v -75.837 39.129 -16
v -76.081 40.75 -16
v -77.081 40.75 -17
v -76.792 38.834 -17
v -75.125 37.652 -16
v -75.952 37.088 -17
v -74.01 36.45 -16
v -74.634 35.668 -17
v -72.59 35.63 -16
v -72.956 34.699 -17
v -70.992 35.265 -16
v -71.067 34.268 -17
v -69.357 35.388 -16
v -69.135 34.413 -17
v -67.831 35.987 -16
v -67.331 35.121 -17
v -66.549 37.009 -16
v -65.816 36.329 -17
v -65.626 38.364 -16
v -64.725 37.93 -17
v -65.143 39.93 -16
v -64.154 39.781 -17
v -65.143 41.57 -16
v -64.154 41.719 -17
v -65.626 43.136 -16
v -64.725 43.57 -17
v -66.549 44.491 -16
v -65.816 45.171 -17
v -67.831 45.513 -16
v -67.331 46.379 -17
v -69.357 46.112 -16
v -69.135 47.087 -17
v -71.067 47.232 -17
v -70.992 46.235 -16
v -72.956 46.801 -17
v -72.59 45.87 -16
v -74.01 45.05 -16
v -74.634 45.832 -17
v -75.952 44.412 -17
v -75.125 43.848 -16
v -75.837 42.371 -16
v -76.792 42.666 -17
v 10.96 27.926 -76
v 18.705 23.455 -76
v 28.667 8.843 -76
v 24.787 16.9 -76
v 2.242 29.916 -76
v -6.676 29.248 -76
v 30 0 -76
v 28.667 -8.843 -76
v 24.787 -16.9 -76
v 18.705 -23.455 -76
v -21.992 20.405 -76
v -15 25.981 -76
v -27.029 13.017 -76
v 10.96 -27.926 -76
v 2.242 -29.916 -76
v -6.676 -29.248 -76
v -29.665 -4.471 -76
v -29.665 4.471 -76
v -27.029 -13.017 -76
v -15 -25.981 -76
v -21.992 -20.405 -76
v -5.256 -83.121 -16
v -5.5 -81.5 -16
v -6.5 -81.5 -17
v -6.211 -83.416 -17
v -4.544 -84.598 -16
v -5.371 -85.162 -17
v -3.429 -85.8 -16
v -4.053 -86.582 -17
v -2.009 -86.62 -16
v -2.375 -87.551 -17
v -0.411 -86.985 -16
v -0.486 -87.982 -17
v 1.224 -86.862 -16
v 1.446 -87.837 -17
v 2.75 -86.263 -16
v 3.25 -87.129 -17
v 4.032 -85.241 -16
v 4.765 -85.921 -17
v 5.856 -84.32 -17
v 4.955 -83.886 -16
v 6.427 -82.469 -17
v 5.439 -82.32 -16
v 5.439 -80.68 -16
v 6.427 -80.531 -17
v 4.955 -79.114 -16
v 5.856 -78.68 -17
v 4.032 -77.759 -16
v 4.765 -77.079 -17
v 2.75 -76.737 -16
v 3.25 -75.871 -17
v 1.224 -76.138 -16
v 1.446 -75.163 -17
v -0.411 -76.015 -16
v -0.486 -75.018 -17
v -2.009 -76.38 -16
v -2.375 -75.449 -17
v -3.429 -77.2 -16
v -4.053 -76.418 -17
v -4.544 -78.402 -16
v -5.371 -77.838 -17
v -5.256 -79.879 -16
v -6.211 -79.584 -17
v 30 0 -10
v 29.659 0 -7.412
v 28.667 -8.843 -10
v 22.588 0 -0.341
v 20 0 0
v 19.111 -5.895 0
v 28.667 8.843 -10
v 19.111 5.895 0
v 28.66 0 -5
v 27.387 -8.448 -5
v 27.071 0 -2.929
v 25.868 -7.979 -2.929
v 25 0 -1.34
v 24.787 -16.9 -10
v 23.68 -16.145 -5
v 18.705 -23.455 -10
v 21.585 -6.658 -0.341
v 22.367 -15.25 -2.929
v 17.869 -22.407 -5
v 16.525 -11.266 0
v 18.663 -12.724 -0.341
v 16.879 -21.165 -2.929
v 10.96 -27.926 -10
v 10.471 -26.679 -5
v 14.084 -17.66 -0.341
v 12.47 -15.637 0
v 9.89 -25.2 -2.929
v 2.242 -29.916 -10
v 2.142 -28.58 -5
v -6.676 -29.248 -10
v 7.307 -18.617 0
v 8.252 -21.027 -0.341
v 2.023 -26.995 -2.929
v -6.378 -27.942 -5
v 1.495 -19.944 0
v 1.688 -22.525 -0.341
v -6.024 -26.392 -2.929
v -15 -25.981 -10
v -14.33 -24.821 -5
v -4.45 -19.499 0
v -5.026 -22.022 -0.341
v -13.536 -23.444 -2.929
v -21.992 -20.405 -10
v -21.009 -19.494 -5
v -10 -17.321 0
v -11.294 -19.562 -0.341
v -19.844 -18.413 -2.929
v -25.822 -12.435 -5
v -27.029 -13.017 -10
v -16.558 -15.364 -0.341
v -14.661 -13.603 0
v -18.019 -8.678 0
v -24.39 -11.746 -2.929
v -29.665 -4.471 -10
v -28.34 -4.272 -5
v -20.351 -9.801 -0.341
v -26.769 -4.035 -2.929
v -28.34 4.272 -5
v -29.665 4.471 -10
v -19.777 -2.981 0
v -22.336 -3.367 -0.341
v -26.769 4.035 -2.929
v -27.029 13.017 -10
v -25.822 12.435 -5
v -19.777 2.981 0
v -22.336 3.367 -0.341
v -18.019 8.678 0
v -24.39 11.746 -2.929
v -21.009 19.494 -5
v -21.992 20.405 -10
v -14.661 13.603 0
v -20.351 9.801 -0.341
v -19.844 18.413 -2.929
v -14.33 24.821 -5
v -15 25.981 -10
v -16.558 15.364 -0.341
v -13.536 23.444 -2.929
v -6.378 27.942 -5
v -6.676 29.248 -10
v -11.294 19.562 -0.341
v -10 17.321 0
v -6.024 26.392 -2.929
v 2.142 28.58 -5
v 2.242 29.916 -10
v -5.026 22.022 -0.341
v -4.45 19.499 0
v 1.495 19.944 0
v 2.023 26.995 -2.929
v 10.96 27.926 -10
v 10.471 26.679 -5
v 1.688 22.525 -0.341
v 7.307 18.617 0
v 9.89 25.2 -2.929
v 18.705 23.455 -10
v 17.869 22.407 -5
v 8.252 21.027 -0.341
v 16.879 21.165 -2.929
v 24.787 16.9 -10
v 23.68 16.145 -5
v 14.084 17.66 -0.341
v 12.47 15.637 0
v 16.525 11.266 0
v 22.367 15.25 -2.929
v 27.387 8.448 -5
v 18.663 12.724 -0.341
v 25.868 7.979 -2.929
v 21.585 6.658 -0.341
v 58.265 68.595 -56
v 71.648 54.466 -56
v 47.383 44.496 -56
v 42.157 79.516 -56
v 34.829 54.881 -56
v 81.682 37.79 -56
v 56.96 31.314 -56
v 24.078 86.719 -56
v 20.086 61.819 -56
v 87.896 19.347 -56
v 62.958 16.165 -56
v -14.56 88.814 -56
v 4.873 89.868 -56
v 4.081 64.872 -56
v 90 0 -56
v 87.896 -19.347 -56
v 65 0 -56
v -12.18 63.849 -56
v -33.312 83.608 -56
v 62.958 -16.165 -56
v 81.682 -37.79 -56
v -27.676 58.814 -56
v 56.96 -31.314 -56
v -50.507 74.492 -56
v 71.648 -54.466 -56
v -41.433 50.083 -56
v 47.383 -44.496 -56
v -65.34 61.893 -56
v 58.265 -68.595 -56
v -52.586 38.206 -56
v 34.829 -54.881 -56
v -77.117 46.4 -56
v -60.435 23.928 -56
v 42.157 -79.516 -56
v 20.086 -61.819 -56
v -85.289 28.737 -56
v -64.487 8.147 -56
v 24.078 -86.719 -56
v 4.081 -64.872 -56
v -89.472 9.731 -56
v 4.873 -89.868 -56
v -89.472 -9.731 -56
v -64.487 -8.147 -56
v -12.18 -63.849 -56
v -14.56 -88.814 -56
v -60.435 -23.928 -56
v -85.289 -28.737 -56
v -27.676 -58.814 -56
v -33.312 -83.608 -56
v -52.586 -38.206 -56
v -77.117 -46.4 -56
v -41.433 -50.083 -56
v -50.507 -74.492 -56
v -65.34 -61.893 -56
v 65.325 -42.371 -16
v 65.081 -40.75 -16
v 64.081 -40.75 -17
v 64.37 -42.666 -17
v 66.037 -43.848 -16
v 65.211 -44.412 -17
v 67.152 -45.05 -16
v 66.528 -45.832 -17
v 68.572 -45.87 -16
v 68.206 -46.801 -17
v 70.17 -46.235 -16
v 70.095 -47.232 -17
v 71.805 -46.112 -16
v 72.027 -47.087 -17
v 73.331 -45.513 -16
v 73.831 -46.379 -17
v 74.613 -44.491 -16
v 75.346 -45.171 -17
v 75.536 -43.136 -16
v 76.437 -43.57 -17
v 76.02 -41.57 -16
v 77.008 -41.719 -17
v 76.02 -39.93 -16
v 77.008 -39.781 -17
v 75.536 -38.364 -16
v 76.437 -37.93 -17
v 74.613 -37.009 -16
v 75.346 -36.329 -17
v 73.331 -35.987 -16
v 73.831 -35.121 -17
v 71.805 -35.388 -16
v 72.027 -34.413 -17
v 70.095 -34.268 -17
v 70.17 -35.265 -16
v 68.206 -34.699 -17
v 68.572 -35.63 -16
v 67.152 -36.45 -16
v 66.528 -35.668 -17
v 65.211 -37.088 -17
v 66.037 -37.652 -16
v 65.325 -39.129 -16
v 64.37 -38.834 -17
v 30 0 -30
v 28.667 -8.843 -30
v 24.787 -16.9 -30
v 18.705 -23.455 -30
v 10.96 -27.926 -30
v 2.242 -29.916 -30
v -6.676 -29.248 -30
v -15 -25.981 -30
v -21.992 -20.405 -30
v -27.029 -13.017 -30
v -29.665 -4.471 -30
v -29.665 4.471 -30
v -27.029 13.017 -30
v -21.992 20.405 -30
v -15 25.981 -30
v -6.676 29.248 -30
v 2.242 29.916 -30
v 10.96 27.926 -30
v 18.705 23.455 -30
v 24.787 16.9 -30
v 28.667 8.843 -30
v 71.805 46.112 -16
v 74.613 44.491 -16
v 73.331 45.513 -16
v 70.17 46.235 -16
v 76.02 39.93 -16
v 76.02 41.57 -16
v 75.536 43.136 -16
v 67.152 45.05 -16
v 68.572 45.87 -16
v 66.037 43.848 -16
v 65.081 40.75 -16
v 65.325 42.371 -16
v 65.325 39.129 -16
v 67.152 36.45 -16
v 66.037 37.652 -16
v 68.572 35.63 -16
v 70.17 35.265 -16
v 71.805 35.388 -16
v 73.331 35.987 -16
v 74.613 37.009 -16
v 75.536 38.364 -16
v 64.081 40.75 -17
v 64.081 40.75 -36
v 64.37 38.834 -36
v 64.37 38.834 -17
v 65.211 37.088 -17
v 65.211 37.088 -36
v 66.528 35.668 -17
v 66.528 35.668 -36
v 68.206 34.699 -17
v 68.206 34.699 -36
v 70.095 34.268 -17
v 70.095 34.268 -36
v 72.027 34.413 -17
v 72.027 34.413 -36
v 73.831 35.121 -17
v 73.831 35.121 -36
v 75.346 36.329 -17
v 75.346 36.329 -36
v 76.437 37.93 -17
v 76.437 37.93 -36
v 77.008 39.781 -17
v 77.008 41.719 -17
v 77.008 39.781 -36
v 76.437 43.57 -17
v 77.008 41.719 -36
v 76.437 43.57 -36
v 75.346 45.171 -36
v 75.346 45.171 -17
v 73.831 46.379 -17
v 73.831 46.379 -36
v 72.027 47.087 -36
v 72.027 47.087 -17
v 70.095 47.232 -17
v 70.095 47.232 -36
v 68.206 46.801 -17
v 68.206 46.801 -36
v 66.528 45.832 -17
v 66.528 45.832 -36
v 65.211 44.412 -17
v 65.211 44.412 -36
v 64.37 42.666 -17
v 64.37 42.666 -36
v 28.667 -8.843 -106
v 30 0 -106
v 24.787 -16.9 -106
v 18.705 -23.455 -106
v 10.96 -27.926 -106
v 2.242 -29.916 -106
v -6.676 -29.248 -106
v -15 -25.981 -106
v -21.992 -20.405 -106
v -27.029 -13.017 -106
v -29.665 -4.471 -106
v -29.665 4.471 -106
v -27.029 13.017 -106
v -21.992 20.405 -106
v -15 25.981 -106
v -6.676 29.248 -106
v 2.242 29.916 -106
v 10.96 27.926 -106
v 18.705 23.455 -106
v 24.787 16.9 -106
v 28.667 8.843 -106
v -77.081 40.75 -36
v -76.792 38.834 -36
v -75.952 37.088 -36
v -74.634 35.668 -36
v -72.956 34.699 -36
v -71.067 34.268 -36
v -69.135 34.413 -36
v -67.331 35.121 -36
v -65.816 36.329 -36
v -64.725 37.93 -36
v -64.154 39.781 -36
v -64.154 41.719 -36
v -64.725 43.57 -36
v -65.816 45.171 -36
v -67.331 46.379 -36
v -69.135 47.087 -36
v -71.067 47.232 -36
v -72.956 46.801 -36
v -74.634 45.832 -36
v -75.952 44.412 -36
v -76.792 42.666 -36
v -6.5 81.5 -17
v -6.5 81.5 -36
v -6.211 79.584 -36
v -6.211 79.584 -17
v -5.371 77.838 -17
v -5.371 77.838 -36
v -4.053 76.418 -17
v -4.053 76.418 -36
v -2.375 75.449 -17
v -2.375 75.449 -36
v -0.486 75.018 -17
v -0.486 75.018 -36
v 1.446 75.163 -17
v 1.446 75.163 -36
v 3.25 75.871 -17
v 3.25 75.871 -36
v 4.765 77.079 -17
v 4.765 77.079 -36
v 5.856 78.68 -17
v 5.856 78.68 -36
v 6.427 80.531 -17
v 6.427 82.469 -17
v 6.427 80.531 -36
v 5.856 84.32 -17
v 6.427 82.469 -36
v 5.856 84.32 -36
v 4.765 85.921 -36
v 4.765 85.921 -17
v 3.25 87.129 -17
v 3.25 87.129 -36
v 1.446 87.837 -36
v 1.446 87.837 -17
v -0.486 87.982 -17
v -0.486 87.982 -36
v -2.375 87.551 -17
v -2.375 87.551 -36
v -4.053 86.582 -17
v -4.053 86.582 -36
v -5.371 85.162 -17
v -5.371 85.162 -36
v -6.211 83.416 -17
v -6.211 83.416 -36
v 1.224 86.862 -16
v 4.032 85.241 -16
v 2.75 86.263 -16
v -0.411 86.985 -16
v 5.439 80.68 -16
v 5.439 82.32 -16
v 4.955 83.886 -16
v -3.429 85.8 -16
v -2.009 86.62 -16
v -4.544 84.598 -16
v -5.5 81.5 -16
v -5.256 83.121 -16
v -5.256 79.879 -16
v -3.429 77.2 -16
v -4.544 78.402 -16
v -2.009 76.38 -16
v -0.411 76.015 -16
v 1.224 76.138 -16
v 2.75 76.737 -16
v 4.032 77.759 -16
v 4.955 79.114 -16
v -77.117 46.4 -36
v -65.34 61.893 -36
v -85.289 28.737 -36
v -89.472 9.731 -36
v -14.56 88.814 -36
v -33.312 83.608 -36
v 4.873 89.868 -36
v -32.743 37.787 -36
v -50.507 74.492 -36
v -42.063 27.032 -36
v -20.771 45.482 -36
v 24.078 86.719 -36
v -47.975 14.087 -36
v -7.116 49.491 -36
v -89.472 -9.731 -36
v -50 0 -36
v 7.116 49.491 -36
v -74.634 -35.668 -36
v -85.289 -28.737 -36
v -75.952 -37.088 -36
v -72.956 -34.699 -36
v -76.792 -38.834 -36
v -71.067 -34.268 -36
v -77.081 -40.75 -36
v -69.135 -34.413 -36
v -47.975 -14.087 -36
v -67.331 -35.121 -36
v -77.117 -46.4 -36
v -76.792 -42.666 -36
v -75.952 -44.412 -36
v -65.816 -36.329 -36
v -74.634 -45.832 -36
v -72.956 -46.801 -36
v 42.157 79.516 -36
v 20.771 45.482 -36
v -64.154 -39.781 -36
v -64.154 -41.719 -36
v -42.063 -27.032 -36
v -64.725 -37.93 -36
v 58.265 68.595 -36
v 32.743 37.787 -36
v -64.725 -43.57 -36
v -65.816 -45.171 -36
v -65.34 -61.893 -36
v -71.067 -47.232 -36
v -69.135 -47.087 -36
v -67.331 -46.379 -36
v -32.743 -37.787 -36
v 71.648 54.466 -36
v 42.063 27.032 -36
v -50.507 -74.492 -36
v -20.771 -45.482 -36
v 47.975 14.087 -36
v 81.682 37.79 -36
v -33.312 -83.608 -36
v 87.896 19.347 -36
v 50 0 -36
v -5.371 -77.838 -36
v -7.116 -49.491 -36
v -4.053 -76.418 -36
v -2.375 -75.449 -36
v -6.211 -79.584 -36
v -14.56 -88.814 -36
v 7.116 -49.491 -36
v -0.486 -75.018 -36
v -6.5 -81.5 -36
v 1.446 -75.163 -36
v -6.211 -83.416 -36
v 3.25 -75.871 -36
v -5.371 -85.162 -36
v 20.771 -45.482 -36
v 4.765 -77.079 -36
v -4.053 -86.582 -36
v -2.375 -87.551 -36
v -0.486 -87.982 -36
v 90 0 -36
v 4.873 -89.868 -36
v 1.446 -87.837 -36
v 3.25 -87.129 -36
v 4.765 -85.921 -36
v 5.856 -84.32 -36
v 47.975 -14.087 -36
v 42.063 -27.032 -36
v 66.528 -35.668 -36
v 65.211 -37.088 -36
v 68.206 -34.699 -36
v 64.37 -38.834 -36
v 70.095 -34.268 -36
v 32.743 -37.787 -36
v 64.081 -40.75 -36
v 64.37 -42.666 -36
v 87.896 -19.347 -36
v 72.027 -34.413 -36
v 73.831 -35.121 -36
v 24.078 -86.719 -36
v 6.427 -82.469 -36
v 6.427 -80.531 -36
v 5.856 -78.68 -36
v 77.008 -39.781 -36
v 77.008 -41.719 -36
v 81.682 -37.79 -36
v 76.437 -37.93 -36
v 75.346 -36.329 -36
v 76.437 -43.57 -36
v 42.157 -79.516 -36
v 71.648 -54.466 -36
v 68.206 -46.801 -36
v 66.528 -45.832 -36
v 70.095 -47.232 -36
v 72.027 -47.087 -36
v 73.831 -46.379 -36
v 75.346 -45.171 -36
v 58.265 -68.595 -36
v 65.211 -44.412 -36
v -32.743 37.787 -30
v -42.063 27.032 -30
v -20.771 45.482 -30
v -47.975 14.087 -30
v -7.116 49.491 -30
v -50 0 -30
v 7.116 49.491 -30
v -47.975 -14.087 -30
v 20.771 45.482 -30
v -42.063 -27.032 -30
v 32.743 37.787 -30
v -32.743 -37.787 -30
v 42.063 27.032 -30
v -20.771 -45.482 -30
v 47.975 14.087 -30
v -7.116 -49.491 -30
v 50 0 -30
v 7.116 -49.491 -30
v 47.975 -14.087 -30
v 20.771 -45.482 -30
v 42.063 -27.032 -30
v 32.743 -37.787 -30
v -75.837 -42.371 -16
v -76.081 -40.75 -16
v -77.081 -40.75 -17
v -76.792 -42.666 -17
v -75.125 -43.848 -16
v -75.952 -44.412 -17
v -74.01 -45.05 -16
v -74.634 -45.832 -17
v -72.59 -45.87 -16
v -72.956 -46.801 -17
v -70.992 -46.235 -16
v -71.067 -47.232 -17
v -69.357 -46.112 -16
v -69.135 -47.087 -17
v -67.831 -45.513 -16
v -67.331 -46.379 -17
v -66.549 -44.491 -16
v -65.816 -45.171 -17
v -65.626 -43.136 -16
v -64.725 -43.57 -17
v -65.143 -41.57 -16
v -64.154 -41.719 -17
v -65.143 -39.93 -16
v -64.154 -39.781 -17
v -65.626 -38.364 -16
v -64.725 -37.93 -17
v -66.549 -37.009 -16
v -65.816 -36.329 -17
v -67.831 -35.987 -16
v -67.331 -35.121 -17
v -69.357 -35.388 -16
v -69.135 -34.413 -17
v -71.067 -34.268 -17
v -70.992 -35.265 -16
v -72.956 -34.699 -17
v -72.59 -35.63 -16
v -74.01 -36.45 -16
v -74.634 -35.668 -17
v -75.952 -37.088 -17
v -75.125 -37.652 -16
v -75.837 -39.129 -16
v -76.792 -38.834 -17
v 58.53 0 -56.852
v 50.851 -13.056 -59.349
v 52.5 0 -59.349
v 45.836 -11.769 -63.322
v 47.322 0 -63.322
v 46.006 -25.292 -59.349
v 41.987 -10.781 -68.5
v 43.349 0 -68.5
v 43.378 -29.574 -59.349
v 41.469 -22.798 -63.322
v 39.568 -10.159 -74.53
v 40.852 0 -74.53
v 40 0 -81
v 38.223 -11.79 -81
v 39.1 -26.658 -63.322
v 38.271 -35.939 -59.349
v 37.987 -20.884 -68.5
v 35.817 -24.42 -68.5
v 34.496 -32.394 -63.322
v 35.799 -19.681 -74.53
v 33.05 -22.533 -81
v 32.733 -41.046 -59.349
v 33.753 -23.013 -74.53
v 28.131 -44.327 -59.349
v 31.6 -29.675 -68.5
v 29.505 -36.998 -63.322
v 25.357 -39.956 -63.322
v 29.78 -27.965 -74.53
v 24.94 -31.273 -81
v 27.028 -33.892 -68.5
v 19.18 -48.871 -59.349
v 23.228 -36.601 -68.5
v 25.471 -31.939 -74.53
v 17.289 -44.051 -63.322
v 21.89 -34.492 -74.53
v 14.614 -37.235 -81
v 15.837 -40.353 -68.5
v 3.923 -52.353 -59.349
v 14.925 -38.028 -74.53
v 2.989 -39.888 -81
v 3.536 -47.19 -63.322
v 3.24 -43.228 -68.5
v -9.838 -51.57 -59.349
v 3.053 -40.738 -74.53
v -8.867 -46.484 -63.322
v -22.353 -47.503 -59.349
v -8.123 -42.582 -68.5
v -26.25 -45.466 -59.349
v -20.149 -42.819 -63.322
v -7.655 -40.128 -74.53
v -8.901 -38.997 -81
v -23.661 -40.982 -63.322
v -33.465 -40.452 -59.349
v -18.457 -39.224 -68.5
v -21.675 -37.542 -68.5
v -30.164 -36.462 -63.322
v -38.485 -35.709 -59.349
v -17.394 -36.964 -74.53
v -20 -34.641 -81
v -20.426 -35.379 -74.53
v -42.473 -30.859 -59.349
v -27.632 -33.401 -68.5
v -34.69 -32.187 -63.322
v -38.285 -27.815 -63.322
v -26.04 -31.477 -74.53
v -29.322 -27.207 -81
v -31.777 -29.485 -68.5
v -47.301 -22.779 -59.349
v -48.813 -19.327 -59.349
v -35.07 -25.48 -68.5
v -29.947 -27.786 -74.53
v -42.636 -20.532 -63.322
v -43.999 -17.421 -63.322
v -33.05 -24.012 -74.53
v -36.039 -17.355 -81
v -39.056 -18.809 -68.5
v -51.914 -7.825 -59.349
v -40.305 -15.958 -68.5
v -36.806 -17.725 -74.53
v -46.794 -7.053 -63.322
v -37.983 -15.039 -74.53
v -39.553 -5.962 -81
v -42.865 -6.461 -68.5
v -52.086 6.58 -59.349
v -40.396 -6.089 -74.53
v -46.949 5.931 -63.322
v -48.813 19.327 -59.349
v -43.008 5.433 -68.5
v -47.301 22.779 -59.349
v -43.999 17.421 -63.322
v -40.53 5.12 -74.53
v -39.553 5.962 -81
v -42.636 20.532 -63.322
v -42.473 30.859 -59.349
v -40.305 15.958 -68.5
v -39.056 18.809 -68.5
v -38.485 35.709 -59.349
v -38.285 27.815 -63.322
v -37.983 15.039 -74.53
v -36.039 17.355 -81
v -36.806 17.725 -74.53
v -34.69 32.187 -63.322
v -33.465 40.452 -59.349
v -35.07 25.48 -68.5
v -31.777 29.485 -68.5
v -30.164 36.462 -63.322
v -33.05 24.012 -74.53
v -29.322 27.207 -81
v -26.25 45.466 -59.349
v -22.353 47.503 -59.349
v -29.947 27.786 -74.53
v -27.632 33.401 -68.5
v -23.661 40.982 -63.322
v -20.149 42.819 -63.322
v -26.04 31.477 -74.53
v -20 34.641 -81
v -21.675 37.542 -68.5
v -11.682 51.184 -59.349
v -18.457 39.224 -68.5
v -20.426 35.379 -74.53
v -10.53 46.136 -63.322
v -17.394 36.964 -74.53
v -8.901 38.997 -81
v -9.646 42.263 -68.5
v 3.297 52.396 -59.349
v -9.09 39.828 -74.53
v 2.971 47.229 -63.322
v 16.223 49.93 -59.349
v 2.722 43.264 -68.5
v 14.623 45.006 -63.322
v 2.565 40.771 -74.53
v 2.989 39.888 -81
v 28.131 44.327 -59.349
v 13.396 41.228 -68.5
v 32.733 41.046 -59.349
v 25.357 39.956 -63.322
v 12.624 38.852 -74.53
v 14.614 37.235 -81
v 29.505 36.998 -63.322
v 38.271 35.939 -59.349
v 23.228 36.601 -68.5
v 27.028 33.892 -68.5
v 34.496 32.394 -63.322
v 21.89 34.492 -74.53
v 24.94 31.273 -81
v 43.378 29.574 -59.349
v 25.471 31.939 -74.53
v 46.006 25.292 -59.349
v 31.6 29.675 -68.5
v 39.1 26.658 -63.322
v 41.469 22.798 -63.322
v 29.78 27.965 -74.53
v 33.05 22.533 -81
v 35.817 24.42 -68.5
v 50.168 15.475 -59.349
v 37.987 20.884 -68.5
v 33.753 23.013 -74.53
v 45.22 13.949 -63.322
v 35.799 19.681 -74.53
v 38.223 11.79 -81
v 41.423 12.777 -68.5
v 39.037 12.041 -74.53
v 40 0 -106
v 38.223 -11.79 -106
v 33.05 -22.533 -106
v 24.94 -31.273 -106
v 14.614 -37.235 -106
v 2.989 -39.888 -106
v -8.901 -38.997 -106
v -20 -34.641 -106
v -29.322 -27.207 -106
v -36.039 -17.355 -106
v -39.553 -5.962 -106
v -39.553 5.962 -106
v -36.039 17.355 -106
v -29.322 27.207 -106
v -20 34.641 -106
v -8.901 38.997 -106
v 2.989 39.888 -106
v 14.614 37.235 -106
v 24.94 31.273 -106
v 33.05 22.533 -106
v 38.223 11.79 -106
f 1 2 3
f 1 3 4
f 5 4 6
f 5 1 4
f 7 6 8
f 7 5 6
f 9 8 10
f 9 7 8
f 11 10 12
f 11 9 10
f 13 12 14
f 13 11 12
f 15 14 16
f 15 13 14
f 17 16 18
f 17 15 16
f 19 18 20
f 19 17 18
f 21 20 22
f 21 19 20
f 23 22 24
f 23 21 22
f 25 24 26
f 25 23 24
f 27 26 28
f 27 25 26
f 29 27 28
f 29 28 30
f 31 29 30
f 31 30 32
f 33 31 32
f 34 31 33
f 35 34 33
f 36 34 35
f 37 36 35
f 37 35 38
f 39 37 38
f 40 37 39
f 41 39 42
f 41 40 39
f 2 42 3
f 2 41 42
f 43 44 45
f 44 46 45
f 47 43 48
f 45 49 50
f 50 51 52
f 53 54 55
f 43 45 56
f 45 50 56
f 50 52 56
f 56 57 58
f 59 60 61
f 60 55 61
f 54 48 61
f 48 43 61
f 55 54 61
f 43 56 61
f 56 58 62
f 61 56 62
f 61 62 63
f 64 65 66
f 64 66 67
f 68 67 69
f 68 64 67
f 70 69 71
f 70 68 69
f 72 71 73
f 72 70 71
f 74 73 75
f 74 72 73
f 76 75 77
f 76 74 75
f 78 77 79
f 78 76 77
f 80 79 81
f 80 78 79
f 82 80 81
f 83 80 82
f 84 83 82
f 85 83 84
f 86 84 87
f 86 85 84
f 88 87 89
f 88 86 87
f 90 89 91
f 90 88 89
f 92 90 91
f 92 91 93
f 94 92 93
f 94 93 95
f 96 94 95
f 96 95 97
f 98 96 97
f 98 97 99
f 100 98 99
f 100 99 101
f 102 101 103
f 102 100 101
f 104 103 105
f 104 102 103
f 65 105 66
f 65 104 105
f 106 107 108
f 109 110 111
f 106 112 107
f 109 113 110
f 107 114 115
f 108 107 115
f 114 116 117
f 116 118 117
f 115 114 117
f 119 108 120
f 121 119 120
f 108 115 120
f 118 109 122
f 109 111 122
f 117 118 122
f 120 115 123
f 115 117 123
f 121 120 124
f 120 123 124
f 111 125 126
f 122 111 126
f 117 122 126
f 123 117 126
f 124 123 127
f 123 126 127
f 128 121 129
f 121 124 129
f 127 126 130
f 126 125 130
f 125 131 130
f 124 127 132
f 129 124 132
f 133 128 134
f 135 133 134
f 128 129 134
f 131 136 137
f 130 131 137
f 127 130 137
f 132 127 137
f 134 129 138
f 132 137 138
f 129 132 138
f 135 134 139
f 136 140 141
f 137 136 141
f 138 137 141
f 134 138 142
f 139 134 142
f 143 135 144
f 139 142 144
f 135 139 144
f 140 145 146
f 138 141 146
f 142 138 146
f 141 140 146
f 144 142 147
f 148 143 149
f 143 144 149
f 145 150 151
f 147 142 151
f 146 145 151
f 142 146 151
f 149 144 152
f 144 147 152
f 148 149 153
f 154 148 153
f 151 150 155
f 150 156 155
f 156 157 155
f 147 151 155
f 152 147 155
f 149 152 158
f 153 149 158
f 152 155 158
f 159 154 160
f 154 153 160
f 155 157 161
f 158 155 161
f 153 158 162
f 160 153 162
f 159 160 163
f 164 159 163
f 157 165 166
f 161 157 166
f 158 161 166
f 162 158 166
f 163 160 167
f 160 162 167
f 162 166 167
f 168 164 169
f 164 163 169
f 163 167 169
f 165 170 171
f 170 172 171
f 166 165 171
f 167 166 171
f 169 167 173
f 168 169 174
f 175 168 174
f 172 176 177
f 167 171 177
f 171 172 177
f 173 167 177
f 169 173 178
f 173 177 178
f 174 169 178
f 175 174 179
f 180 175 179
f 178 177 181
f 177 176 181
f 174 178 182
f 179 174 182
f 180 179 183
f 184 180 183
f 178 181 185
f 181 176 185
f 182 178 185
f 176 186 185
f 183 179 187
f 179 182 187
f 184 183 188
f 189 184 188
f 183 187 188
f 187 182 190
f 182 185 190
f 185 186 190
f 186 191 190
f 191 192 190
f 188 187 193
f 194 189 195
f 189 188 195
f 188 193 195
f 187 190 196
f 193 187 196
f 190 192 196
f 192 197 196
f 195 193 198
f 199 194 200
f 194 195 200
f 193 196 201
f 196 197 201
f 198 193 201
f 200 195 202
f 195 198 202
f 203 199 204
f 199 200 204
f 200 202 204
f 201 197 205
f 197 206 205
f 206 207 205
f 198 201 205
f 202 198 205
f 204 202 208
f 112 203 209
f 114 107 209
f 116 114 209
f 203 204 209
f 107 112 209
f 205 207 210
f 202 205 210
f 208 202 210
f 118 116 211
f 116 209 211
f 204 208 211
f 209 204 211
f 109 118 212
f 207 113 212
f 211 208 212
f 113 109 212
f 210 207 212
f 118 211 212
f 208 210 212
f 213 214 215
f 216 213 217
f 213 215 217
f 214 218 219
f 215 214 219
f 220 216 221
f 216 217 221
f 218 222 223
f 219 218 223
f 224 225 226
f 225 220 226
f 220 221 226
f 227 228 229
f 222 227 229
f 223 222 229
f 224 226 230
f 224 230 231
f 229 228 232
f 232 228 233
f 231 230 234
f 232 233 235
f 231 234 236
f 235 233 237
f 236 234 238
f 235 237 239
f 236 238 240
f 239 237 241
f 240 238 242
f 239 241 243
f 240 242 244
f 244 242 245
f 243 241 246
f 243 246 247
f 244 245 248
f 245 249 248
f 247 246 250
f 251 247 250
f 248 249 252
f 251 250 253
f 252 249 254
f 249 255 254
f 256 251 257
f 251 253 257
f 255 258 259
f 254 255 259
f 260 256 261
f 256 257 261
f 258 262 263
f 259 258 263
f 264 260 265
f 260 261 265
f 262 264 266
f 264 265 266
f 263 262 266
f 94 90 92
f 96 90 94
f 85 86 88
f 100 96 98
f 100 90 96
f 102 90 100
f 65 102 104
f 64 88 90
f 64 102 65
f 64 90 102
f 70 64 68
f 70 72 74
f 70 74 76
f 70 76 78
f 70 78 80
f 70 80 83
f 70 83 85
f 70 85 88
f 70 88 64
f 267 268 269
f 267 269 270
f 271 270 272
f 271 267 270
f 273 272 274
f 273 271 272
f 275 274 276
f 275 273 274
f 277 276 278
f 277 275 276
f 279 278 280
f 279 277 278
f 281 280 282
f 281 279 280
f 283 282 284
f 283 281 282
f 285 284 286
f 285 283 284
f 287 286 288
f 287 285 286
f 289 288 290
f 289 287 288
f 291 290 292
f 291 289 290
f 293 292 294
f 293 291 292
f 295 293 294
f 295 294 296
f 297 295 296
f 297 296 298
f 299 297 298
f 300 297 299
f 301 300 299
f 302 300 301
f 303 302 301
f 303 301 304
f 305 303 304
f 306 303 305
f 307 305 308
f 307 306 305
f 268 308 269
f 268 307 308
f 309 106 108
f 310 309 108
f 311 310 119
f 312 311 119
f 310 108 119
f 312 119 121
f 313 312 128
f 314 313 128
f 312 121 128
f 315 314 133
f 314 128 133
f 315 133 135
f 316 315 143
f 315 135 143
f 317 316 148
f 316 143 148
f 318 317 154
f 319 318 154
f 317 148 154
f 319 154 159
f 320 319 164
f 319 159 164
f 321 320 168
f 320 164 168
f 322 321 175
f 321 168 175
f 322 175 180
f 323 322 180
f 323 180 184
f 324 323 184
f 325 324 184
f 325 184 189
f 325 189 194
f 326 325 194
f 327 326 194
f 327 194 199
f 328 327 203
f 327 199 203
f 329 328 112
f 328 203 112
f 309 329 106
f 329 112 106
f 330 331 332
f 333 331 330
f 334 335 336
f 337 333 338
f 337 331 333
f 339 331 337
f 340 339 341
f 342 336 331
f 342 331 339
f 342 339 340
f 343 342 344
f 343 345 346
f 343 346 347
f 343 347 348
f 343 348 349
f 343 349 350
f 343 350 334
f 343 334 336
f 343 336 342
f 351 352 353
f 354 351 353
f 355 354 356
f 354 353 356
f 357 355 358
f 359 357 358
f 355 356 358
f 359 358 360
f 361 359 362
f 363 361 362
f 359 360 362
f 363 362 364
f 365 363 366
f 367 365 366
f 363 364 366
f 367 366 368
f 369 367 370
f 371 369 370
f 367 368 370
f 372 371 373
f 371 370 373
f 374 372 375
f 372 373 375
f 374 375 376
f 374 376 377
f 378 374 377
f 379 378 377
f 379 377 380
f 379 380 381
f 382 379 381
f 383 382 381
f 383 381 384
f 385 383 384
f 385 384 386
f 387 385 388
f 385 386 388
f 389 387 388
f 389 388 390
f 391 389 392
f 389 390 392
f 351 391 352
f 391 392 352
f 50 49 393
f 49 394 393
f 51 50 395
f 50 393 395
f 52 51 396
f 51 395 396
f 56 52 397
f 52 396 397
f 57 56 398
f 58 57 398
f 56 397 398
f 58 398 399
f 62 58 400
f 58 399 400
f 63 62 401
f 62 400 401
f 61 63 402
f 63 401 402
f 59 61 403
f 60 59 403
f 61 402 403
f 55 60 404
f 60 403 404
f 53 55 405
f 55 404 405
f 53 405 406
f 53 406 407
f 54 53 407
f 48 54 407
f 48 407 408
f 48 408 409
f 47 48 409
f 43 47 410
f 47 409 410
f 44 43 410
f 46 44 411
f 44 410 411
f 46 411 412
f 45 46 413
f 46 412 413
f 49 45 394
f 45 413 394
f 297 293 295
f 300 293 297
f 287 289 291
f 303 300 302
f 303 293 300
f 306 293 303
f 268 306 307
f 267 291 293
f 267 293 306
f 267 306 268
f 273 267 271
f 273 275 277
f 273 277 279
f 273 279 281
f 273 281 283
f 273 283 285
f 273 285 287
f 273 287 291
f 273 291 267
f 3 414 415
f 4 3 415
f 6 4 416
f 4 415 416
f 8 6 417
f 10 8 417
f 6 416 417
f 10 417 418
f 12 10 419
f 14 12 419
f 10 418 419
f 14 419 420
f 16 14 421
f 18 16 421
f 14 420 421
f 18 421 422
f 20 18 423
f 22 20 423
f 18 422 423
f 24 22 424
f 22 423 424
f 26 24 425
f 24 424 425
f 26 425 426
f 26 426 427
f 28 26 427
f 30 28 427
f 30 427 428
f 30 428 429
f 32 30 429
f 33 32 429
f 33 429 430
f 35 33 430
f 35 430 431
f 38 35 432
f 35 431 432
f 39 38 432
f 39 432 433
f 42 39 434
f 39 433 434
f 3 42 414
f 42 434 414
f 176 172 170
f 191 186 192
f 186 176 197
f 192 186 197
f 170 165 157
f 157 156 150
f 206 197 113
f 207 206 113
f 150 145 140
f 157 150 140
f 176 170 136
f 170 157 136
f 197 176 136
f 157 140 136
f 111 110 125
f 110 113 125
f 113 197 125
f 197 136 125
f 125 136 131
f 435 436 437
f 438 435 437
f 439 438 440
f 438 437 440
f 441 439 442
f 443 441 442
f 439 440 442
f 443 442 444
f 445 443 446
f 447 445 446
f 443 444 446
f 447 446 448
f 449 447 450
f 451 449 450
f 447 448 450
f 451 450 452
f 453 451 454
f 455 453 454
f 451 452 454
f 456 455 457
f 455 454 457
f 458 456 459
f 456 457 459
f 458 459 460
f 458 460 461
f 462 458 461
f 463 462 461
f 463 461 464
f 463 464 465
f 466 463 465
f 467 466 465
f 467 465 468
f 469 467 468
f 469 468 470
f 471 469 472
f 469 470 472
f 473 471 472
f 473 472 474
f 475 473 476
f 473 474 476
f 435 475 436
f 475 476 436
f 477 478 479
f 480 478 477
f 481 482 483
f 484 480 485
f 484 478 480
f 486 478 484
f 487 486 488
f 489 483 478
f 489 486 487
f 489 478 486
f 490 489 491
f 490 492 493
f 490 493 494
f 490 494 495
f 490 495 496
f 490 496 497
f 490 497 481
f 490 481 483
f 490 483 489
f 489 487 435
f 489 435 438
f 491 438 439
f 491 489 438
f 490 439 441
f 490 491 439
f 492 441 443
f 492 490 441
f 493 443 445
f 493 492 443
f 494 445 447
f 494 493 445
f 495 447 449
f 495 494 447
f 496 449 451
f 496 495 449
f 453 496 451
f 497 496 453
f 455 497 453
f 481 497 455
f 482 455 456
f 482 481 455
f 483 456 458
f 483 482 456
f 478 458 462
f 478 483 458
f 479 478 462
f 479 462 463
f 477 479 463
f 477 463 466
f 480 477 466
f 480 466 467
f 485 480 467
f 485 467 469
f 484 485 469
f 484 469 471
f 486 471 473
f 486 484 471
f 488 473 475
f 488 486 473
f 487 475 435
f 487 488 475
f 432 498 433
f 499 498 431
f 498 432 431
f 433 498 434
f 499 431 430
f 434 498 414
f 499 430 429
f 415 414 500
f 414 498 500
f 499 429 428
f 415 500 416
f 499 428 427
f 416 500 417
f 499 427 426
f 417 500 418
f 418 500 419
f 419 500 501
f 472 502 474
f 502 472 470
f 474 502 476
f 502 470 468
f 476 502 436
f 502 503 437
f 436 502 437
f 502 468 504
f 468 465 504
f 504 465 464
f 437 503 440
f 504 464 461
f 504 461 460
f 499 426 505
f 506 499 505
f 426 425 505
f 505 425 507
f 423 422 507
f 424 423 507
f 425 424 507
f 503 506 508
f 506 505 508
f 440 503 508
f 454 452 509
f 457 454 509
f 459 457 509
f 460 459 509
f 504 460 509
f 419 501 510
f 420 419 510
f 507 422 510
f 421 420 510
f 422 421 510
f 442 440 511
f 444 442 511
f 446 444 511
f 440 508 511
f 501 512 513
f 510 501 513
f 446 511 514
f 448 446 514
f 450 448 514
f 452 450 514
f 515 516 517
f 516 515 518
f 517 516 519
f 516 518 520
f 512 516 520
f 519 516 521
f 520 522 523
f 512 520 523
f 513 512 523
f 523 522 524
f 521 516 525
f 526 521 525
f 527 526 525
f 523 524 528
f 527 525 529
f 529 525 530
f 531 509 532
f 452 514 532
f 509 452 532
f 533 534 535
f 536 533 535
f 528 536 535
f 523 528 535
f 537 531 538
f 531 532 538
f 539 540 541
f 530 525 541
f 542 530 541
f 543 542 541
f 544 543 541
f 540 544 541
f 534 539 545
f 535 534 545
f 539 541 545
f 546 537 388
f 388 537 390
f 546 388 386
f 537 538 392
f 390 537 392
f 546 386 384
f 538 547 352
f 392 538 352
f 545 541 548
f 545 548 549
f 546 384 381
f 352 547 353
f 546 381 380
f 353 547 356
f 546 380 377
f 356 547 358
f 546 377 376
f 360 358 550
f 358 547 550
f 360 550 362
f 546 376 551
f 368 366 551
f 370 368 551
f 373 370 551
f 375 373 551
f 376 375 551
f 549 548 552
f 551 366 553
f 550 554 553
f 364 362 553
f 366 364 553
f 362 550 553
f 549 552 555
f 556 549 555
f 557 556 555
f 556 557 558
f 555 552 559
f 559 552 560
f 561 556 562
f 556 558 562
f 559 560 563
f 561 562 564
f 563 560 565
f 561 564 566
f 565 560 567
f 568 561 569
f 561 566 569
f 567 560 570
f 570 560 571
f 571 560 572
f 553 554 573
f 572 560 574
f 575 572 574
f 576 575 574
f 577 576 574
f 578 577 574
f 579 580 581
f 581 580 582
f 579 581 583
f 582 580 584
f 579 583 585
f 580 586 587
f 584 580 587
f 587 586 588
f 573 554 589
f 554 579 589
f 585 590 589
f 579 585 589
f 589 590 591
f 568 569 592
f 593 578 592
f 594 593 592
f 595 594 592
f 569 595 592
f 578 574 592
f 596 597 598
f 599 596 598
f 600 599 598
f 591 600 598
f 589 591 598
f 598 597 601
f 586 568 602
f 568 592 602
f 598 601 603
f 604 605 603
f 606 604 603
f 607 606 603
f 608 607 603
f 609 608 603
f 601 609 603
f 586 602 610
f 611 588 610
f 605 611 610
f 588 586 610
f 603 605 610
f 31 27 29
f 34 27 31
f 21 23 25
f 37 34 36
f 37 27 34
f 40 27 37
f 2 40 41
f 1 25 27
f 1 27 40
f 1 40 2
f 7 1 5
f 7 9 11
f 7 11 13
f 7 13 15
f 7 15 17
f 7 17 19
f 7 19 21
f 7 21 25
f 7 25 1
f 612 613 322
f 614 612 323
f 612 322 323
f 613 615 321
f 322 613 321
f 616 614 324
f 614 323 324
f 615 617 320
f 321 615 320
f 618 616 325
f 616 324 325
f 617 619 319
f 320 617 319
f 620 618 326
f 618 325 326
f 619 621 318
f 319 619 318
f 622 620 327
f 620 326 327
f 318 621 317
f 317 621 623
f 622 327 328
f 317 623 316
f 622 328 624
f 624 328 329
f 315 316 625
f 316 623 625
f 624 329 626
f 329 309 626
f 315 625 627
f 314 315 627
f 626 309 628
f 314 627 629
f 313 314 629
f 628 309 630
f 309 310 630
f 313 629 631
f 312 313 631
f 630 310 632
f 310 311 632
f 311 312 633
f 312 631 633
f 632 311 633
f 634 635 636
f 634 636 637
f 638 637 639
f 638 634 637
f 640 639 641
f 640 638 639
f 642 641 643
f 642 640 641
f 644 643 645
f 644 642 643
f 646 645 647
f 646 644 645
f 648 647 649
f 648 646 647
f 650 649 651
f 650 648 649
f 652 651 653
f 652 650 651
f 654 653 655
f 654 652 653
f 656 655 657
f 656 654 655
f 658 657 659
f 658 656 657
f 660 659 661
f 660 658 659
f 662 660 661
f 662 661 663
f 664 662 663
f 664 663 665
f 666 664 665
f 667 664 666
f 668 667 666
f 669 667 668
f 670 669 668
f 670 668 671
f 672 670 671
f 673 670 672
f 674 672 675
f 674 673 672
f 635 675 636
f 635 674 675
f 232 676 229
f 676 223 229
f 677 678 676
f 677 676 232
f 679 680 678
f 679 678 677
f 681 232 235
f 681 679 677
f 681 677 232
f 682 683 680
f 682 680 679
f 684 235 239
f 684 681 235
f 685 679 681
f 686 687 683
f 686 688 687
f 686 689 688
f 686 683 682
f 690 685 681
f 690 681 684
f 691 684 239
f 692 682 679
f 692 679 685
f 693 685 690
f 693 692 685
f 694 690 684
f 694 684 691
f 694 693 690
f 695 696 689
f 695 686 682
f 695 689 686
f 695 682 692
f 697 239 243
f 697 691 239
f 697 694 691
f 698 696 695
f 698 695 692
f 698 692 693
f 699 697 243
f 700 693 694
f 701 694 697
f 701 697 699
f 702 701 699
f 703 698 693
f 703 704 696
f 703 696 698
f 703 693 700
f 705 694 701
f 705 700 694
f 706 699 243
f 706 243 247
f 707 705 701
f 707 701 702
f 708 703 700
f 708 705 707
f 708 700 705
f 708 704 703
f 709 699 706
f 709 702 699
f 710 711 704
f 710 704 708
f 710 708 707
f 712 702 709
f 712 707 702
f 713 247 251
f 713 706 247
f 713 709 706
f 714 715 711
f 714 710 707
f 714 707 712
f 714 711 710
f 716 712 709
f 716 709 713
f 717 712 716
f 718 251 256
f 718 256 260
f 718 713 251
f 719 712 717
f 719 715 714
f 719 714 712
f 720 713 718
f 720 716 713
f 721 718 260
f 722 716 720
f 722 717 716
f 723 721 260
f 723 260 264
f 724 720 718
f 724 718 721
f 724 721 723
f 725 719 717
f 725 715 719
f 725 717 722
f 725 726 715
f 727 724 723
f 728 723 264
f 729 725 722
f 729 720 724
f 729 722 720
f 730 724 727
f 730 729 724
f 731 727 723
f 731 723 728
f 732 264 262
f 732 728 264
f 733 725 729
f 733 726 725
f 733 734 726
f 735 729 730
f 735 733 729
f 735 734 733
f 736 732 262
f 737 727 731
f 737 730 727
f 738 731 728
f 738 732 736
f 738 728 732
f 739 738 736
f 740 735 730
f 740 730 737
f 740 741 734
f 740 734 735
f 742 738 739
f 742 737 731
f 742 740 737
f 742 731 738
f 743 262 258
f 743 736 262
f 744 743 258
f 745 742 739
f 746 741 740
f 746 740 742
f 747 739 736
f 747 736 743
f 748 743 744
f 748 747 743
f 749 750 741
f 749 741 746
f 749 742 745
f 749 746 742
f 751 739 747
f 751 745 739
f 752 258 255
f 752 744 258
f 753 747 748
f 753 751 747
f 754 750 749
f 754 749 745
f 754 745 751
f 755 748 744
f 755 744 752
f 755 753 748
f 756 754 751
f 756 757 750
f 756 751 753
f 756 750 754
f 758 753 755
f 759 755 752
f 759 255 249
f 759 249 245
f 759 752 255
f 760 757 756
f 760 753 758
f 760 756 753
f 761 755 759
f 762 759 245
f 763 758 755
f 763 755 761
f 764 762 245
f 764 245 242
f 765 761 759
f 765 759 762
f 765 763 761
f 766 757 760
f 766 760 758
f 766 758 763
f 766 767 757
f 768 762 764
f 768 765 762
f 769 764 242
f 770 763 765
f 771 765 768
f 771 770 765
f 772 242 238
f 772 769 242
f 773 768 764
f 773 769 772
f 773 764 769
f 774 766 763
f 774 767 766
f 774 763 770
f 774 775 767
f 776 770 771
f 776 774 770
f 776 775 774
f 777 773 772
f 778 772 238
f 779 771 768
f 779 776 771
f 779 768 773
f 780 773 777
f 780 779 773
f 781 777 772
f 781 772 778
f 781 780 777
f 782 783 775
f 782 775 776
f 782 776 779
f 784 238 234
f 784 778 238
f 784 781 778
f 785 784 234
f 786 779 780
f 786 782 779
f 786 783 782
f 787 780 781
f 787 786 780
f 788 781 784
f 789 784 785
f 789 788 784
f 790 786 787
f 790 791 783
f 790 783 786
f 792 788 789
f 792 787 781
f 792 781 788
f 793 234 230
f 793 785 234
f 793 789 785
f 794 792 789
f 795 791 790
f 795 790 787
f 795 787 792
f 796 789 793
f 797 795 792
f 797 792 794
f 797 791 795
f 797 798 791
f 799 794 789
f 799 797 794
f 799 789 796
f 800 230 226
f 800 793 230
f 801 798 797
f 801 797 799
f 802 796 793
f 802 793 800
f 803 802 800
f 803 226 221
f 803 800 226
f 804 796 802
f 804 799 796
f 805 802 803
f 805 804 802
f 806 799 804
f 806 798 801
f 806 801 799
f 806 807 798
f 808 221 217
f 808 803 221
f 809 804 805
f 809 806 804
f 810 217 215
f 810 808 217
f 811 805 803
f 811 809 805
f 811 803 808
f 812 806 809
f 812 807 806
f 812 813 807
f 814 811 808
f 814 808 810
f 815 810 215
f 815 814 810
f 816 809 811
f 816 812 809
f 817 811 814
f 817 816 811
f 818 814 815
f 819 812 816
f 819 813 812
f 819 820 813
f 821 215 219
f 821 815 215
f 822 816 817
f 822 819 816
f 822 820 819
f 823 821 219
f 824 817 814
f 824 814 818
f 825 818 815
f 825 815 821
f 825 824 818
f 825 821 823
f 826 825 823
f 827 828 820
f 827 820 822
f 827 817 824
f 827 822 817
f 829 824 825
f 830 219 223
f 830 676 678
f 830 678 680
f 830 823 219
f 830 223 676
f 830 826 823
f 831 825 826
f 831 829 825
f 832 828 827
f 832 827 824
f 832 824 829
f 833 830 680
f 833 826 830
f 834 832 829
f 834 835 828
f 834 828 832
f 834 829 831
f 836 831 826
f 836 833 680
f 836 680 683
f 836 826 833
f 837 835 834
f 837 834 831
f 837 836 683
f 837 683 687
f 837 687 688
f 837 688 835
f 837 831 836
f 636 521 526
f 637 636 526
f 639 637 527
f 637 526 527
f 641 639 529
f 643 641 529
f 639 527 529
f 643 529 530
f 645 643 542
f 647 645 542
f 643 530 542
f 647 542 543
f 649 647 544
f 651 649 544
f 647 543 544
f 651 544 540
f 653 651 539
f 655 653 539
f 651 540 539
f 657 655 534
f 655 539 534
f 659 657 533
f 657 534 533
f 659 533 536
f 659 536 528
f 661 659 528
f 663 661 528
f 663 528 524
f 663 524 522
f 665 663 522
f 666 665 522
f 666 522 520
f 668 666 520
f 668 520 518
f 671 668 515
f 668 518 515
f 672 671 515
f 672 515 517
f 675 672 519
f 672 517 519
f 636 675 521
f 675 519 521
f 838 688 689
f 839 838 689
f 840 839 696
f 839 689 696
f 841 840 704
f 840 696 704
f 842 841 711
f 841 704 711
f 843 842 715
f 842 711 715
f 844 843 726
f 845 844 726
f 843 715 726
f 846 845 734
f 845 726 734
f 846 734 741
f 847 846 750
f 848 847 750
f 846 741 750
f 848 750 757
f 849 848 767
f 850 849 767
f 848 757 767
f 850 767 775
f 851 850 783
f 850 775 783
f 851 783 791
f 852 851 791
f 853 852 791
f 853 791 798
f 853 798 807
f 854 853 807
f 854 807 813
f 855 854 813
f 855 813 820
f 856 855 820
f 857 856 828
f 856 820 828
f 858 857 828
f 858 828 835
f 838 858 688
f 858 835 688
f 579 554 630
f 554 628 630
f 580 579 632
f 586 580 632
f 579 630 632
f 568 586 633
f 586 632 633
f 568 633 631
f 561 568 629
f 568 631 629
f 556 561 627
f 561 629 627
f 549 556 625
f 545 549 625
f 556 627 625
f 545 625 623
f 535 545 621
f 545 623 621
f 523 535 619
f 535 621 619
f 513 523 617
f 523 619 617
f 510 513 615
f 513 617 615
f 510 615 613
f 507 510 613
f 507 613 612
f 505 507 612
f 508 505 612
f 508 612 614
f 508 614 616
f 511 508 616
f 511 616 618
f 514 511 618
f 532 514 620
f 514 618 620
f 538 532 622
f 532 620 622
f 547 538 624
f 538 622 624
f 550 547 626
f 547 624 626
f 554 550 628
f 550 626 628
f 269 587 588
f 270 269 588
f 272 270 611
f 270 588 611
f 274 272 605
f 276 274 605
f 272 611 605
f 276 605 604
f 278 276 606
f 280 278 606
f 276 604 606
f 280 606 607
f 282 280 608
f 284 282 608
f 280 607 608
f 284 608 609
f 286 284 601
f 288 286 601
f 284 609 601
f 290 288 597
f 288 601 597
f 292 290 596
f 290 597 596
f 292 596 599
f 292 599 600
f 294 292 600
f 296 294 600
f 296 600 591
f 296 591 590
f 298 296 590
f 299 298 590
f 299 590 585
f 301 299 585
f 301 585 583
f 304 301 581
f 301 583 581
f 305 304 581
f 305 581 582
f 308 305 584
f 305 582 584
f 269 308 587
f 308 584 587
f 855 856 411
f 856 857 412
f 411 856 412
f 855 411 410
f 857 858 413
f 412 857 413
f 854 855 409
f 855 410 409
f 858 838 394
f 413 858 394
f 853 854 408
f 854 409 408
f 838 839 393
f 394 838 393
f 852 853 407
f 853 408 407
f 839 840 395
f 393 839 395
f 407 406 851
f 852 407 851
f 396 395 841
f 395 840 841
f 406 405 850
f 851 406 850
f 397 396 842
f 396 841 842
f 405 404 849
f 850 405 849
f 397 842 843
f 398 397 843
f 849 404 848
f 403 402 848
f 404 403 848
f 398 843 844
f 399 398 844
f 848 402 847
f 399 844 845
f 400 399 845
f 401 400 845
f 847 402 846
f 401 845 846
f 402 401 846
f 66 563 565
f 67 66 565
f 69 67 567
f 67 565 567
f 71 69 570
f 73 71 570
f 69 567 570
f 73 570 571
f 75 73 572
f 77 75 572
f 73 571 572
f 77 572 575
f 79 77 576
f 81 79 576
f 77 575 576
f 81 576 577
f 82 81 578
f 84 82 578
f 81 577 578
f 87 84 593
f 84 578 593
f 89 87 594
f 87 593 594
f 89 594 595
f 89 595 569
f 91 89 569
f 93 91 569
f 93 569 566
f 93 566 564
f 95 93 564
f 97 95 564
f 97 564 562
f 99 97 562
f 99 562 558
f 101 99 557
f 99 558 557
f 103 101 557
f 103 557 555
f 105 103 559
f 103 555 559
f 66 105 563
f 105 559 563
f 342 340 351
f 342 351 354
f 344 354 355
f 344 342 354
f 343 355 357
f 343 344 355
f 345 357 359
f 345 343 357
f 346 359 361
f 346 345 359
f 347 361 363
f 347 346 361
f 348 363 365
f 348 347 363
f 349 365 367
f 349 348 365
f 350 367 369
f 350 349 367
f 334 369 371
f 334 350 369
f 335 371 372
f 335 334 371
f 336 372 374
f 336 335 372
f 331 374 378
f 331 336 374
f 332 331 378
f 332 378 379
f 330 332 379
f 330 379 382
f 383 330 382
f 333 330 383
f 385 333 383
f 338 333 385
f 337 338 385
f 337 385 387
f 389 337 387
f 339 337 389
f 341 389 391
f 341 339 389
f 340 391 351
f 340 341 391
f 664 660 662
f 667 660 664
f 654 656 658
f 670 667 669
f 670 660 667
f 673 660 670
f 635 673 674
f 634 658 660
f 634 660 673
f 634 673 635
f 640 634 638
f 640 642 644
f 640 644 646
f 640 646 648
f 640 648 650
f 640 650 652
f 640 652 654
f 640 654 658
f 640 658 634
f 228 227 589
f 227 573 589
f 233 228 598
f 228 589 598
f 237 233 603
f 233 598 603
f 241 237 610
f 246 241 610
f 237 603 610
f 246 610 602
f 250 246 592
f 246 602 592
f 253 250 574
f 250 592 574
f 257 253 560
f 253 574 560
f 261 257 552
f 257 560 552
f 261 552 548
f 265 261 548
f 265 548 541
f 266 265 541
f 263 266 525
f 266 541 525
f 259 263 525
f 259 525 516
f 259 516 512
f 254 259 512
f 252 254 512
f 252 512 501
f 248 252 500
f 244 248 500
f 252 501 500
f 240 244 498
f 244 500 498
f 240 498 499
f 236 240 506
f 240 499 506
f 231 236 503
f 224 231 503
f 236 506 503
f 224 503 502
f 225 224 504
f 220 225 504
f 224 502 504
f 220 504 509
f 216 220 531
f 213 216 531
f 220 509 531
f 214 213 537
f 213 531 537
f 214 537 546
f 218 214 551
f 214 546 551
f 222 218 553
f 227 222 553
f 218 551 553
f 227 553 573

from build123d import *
from OCP.BRepFilletAPI import BRepFilletAPI_MakeFillet

# Parameters (mm, degrees)
SKETCH7_R           = 6.5
BOSS_EXTRUDE2_DEPTH = 20
FILLET2_R1          = 25
FILLET2_R2          = 10
CHAMFER1_SIZE       = 1


with BuildPart() as part:
    # Sketch6 → Revolve2 (revolve)
    with BuildSketch(Plane(origin=(0, 0, -433528.712964682), x_dir=(-1, 0, 0), z_dir=(0, -1, 0))):
        Polygon((-30, -433528.712964682), (0, -433528.712964682), (0, -433452.712964682), (-30, -433452.712964682), (-30, -433422.712964682), (-40, -433422.712964682), (-40, -433472.712964682), (-90, -433472.712964682), (-90, -433492.712964682), (-50, -433492.712964682), (-50, -433498.712964682), (-30, -433498.712964682), align=None)
    revolve(axis=Axis((0, 0, 0), (0, 0, -1)))

    # Sketch7 → Boss-Extrude2 (add)
    with BuildSketch(Plane(origin=(0, 0, -36), x_dir=(-1, 0, 0), z_dir=(0, 0, 1))):
        with Locations((70.581070408, 40.75)):
            Circle(SKETCH7_R)
        with Locations((0, 81.5)):
            Circle(SKETCH7_R)
        with Locations((70.581070408, -40.75)):
            Circle(SKETCH7_R)
        with Locations((0, -81.5)):
            Circle(SKETCH7_R)
        with Locations((-70.581070408, -40.75)):
            Circle(SKETCH7_R)
        with Locations((-70.581070408, 40.75)):
            Circle(SKETCH7_R)
    extrude(amount=BOSS_EXTRUDE2_DEPTH)

    # Fillet2: one fillet with a radius per group of edges: ONE call of the kernel's fillet builder (fillet() takes one radius for all edges)
    fillet2_edges_1 = [part.edges().sort_by_distance(p)[0] for p in [
        (-40, 0, -56),
    ]]
    fillet2_edges_2 = [part.edges().sort_by_distance(p)[0] for p in [
        (-30, 0, 0),
    ]]
    fillet2 = BRepFilletAPI_MakeFillet(part.part.solid().wrapped)
    for e in fillet2_edges_1:
        fillet2.Add(FILLET2_R1, e.wrapped)
    for e in fillet2_edges_2:
        fillet2.Add(FILLET2_R2, e.wrapped)
    add(Compound.cast(fillet2.Shape()), mode=Mode.REPLACE)

    # Chamfer1
    chamfer1_edges = [part.edges().sort_by_distance(p)[0] for p in [
        (-64.081070408, -40.75, -16),
        (77.081070408, 40.75, -16),
        (77.081070408, -40.75, -16),
        (6.5, -81.5, -16),
        (6.5, 81.5, -16),
        (-64.081070408, 40.75, -16),
    ]]
    chamfer(chamfer1_edges, length=CHAMFER1_SIZE)


solid = part.part
